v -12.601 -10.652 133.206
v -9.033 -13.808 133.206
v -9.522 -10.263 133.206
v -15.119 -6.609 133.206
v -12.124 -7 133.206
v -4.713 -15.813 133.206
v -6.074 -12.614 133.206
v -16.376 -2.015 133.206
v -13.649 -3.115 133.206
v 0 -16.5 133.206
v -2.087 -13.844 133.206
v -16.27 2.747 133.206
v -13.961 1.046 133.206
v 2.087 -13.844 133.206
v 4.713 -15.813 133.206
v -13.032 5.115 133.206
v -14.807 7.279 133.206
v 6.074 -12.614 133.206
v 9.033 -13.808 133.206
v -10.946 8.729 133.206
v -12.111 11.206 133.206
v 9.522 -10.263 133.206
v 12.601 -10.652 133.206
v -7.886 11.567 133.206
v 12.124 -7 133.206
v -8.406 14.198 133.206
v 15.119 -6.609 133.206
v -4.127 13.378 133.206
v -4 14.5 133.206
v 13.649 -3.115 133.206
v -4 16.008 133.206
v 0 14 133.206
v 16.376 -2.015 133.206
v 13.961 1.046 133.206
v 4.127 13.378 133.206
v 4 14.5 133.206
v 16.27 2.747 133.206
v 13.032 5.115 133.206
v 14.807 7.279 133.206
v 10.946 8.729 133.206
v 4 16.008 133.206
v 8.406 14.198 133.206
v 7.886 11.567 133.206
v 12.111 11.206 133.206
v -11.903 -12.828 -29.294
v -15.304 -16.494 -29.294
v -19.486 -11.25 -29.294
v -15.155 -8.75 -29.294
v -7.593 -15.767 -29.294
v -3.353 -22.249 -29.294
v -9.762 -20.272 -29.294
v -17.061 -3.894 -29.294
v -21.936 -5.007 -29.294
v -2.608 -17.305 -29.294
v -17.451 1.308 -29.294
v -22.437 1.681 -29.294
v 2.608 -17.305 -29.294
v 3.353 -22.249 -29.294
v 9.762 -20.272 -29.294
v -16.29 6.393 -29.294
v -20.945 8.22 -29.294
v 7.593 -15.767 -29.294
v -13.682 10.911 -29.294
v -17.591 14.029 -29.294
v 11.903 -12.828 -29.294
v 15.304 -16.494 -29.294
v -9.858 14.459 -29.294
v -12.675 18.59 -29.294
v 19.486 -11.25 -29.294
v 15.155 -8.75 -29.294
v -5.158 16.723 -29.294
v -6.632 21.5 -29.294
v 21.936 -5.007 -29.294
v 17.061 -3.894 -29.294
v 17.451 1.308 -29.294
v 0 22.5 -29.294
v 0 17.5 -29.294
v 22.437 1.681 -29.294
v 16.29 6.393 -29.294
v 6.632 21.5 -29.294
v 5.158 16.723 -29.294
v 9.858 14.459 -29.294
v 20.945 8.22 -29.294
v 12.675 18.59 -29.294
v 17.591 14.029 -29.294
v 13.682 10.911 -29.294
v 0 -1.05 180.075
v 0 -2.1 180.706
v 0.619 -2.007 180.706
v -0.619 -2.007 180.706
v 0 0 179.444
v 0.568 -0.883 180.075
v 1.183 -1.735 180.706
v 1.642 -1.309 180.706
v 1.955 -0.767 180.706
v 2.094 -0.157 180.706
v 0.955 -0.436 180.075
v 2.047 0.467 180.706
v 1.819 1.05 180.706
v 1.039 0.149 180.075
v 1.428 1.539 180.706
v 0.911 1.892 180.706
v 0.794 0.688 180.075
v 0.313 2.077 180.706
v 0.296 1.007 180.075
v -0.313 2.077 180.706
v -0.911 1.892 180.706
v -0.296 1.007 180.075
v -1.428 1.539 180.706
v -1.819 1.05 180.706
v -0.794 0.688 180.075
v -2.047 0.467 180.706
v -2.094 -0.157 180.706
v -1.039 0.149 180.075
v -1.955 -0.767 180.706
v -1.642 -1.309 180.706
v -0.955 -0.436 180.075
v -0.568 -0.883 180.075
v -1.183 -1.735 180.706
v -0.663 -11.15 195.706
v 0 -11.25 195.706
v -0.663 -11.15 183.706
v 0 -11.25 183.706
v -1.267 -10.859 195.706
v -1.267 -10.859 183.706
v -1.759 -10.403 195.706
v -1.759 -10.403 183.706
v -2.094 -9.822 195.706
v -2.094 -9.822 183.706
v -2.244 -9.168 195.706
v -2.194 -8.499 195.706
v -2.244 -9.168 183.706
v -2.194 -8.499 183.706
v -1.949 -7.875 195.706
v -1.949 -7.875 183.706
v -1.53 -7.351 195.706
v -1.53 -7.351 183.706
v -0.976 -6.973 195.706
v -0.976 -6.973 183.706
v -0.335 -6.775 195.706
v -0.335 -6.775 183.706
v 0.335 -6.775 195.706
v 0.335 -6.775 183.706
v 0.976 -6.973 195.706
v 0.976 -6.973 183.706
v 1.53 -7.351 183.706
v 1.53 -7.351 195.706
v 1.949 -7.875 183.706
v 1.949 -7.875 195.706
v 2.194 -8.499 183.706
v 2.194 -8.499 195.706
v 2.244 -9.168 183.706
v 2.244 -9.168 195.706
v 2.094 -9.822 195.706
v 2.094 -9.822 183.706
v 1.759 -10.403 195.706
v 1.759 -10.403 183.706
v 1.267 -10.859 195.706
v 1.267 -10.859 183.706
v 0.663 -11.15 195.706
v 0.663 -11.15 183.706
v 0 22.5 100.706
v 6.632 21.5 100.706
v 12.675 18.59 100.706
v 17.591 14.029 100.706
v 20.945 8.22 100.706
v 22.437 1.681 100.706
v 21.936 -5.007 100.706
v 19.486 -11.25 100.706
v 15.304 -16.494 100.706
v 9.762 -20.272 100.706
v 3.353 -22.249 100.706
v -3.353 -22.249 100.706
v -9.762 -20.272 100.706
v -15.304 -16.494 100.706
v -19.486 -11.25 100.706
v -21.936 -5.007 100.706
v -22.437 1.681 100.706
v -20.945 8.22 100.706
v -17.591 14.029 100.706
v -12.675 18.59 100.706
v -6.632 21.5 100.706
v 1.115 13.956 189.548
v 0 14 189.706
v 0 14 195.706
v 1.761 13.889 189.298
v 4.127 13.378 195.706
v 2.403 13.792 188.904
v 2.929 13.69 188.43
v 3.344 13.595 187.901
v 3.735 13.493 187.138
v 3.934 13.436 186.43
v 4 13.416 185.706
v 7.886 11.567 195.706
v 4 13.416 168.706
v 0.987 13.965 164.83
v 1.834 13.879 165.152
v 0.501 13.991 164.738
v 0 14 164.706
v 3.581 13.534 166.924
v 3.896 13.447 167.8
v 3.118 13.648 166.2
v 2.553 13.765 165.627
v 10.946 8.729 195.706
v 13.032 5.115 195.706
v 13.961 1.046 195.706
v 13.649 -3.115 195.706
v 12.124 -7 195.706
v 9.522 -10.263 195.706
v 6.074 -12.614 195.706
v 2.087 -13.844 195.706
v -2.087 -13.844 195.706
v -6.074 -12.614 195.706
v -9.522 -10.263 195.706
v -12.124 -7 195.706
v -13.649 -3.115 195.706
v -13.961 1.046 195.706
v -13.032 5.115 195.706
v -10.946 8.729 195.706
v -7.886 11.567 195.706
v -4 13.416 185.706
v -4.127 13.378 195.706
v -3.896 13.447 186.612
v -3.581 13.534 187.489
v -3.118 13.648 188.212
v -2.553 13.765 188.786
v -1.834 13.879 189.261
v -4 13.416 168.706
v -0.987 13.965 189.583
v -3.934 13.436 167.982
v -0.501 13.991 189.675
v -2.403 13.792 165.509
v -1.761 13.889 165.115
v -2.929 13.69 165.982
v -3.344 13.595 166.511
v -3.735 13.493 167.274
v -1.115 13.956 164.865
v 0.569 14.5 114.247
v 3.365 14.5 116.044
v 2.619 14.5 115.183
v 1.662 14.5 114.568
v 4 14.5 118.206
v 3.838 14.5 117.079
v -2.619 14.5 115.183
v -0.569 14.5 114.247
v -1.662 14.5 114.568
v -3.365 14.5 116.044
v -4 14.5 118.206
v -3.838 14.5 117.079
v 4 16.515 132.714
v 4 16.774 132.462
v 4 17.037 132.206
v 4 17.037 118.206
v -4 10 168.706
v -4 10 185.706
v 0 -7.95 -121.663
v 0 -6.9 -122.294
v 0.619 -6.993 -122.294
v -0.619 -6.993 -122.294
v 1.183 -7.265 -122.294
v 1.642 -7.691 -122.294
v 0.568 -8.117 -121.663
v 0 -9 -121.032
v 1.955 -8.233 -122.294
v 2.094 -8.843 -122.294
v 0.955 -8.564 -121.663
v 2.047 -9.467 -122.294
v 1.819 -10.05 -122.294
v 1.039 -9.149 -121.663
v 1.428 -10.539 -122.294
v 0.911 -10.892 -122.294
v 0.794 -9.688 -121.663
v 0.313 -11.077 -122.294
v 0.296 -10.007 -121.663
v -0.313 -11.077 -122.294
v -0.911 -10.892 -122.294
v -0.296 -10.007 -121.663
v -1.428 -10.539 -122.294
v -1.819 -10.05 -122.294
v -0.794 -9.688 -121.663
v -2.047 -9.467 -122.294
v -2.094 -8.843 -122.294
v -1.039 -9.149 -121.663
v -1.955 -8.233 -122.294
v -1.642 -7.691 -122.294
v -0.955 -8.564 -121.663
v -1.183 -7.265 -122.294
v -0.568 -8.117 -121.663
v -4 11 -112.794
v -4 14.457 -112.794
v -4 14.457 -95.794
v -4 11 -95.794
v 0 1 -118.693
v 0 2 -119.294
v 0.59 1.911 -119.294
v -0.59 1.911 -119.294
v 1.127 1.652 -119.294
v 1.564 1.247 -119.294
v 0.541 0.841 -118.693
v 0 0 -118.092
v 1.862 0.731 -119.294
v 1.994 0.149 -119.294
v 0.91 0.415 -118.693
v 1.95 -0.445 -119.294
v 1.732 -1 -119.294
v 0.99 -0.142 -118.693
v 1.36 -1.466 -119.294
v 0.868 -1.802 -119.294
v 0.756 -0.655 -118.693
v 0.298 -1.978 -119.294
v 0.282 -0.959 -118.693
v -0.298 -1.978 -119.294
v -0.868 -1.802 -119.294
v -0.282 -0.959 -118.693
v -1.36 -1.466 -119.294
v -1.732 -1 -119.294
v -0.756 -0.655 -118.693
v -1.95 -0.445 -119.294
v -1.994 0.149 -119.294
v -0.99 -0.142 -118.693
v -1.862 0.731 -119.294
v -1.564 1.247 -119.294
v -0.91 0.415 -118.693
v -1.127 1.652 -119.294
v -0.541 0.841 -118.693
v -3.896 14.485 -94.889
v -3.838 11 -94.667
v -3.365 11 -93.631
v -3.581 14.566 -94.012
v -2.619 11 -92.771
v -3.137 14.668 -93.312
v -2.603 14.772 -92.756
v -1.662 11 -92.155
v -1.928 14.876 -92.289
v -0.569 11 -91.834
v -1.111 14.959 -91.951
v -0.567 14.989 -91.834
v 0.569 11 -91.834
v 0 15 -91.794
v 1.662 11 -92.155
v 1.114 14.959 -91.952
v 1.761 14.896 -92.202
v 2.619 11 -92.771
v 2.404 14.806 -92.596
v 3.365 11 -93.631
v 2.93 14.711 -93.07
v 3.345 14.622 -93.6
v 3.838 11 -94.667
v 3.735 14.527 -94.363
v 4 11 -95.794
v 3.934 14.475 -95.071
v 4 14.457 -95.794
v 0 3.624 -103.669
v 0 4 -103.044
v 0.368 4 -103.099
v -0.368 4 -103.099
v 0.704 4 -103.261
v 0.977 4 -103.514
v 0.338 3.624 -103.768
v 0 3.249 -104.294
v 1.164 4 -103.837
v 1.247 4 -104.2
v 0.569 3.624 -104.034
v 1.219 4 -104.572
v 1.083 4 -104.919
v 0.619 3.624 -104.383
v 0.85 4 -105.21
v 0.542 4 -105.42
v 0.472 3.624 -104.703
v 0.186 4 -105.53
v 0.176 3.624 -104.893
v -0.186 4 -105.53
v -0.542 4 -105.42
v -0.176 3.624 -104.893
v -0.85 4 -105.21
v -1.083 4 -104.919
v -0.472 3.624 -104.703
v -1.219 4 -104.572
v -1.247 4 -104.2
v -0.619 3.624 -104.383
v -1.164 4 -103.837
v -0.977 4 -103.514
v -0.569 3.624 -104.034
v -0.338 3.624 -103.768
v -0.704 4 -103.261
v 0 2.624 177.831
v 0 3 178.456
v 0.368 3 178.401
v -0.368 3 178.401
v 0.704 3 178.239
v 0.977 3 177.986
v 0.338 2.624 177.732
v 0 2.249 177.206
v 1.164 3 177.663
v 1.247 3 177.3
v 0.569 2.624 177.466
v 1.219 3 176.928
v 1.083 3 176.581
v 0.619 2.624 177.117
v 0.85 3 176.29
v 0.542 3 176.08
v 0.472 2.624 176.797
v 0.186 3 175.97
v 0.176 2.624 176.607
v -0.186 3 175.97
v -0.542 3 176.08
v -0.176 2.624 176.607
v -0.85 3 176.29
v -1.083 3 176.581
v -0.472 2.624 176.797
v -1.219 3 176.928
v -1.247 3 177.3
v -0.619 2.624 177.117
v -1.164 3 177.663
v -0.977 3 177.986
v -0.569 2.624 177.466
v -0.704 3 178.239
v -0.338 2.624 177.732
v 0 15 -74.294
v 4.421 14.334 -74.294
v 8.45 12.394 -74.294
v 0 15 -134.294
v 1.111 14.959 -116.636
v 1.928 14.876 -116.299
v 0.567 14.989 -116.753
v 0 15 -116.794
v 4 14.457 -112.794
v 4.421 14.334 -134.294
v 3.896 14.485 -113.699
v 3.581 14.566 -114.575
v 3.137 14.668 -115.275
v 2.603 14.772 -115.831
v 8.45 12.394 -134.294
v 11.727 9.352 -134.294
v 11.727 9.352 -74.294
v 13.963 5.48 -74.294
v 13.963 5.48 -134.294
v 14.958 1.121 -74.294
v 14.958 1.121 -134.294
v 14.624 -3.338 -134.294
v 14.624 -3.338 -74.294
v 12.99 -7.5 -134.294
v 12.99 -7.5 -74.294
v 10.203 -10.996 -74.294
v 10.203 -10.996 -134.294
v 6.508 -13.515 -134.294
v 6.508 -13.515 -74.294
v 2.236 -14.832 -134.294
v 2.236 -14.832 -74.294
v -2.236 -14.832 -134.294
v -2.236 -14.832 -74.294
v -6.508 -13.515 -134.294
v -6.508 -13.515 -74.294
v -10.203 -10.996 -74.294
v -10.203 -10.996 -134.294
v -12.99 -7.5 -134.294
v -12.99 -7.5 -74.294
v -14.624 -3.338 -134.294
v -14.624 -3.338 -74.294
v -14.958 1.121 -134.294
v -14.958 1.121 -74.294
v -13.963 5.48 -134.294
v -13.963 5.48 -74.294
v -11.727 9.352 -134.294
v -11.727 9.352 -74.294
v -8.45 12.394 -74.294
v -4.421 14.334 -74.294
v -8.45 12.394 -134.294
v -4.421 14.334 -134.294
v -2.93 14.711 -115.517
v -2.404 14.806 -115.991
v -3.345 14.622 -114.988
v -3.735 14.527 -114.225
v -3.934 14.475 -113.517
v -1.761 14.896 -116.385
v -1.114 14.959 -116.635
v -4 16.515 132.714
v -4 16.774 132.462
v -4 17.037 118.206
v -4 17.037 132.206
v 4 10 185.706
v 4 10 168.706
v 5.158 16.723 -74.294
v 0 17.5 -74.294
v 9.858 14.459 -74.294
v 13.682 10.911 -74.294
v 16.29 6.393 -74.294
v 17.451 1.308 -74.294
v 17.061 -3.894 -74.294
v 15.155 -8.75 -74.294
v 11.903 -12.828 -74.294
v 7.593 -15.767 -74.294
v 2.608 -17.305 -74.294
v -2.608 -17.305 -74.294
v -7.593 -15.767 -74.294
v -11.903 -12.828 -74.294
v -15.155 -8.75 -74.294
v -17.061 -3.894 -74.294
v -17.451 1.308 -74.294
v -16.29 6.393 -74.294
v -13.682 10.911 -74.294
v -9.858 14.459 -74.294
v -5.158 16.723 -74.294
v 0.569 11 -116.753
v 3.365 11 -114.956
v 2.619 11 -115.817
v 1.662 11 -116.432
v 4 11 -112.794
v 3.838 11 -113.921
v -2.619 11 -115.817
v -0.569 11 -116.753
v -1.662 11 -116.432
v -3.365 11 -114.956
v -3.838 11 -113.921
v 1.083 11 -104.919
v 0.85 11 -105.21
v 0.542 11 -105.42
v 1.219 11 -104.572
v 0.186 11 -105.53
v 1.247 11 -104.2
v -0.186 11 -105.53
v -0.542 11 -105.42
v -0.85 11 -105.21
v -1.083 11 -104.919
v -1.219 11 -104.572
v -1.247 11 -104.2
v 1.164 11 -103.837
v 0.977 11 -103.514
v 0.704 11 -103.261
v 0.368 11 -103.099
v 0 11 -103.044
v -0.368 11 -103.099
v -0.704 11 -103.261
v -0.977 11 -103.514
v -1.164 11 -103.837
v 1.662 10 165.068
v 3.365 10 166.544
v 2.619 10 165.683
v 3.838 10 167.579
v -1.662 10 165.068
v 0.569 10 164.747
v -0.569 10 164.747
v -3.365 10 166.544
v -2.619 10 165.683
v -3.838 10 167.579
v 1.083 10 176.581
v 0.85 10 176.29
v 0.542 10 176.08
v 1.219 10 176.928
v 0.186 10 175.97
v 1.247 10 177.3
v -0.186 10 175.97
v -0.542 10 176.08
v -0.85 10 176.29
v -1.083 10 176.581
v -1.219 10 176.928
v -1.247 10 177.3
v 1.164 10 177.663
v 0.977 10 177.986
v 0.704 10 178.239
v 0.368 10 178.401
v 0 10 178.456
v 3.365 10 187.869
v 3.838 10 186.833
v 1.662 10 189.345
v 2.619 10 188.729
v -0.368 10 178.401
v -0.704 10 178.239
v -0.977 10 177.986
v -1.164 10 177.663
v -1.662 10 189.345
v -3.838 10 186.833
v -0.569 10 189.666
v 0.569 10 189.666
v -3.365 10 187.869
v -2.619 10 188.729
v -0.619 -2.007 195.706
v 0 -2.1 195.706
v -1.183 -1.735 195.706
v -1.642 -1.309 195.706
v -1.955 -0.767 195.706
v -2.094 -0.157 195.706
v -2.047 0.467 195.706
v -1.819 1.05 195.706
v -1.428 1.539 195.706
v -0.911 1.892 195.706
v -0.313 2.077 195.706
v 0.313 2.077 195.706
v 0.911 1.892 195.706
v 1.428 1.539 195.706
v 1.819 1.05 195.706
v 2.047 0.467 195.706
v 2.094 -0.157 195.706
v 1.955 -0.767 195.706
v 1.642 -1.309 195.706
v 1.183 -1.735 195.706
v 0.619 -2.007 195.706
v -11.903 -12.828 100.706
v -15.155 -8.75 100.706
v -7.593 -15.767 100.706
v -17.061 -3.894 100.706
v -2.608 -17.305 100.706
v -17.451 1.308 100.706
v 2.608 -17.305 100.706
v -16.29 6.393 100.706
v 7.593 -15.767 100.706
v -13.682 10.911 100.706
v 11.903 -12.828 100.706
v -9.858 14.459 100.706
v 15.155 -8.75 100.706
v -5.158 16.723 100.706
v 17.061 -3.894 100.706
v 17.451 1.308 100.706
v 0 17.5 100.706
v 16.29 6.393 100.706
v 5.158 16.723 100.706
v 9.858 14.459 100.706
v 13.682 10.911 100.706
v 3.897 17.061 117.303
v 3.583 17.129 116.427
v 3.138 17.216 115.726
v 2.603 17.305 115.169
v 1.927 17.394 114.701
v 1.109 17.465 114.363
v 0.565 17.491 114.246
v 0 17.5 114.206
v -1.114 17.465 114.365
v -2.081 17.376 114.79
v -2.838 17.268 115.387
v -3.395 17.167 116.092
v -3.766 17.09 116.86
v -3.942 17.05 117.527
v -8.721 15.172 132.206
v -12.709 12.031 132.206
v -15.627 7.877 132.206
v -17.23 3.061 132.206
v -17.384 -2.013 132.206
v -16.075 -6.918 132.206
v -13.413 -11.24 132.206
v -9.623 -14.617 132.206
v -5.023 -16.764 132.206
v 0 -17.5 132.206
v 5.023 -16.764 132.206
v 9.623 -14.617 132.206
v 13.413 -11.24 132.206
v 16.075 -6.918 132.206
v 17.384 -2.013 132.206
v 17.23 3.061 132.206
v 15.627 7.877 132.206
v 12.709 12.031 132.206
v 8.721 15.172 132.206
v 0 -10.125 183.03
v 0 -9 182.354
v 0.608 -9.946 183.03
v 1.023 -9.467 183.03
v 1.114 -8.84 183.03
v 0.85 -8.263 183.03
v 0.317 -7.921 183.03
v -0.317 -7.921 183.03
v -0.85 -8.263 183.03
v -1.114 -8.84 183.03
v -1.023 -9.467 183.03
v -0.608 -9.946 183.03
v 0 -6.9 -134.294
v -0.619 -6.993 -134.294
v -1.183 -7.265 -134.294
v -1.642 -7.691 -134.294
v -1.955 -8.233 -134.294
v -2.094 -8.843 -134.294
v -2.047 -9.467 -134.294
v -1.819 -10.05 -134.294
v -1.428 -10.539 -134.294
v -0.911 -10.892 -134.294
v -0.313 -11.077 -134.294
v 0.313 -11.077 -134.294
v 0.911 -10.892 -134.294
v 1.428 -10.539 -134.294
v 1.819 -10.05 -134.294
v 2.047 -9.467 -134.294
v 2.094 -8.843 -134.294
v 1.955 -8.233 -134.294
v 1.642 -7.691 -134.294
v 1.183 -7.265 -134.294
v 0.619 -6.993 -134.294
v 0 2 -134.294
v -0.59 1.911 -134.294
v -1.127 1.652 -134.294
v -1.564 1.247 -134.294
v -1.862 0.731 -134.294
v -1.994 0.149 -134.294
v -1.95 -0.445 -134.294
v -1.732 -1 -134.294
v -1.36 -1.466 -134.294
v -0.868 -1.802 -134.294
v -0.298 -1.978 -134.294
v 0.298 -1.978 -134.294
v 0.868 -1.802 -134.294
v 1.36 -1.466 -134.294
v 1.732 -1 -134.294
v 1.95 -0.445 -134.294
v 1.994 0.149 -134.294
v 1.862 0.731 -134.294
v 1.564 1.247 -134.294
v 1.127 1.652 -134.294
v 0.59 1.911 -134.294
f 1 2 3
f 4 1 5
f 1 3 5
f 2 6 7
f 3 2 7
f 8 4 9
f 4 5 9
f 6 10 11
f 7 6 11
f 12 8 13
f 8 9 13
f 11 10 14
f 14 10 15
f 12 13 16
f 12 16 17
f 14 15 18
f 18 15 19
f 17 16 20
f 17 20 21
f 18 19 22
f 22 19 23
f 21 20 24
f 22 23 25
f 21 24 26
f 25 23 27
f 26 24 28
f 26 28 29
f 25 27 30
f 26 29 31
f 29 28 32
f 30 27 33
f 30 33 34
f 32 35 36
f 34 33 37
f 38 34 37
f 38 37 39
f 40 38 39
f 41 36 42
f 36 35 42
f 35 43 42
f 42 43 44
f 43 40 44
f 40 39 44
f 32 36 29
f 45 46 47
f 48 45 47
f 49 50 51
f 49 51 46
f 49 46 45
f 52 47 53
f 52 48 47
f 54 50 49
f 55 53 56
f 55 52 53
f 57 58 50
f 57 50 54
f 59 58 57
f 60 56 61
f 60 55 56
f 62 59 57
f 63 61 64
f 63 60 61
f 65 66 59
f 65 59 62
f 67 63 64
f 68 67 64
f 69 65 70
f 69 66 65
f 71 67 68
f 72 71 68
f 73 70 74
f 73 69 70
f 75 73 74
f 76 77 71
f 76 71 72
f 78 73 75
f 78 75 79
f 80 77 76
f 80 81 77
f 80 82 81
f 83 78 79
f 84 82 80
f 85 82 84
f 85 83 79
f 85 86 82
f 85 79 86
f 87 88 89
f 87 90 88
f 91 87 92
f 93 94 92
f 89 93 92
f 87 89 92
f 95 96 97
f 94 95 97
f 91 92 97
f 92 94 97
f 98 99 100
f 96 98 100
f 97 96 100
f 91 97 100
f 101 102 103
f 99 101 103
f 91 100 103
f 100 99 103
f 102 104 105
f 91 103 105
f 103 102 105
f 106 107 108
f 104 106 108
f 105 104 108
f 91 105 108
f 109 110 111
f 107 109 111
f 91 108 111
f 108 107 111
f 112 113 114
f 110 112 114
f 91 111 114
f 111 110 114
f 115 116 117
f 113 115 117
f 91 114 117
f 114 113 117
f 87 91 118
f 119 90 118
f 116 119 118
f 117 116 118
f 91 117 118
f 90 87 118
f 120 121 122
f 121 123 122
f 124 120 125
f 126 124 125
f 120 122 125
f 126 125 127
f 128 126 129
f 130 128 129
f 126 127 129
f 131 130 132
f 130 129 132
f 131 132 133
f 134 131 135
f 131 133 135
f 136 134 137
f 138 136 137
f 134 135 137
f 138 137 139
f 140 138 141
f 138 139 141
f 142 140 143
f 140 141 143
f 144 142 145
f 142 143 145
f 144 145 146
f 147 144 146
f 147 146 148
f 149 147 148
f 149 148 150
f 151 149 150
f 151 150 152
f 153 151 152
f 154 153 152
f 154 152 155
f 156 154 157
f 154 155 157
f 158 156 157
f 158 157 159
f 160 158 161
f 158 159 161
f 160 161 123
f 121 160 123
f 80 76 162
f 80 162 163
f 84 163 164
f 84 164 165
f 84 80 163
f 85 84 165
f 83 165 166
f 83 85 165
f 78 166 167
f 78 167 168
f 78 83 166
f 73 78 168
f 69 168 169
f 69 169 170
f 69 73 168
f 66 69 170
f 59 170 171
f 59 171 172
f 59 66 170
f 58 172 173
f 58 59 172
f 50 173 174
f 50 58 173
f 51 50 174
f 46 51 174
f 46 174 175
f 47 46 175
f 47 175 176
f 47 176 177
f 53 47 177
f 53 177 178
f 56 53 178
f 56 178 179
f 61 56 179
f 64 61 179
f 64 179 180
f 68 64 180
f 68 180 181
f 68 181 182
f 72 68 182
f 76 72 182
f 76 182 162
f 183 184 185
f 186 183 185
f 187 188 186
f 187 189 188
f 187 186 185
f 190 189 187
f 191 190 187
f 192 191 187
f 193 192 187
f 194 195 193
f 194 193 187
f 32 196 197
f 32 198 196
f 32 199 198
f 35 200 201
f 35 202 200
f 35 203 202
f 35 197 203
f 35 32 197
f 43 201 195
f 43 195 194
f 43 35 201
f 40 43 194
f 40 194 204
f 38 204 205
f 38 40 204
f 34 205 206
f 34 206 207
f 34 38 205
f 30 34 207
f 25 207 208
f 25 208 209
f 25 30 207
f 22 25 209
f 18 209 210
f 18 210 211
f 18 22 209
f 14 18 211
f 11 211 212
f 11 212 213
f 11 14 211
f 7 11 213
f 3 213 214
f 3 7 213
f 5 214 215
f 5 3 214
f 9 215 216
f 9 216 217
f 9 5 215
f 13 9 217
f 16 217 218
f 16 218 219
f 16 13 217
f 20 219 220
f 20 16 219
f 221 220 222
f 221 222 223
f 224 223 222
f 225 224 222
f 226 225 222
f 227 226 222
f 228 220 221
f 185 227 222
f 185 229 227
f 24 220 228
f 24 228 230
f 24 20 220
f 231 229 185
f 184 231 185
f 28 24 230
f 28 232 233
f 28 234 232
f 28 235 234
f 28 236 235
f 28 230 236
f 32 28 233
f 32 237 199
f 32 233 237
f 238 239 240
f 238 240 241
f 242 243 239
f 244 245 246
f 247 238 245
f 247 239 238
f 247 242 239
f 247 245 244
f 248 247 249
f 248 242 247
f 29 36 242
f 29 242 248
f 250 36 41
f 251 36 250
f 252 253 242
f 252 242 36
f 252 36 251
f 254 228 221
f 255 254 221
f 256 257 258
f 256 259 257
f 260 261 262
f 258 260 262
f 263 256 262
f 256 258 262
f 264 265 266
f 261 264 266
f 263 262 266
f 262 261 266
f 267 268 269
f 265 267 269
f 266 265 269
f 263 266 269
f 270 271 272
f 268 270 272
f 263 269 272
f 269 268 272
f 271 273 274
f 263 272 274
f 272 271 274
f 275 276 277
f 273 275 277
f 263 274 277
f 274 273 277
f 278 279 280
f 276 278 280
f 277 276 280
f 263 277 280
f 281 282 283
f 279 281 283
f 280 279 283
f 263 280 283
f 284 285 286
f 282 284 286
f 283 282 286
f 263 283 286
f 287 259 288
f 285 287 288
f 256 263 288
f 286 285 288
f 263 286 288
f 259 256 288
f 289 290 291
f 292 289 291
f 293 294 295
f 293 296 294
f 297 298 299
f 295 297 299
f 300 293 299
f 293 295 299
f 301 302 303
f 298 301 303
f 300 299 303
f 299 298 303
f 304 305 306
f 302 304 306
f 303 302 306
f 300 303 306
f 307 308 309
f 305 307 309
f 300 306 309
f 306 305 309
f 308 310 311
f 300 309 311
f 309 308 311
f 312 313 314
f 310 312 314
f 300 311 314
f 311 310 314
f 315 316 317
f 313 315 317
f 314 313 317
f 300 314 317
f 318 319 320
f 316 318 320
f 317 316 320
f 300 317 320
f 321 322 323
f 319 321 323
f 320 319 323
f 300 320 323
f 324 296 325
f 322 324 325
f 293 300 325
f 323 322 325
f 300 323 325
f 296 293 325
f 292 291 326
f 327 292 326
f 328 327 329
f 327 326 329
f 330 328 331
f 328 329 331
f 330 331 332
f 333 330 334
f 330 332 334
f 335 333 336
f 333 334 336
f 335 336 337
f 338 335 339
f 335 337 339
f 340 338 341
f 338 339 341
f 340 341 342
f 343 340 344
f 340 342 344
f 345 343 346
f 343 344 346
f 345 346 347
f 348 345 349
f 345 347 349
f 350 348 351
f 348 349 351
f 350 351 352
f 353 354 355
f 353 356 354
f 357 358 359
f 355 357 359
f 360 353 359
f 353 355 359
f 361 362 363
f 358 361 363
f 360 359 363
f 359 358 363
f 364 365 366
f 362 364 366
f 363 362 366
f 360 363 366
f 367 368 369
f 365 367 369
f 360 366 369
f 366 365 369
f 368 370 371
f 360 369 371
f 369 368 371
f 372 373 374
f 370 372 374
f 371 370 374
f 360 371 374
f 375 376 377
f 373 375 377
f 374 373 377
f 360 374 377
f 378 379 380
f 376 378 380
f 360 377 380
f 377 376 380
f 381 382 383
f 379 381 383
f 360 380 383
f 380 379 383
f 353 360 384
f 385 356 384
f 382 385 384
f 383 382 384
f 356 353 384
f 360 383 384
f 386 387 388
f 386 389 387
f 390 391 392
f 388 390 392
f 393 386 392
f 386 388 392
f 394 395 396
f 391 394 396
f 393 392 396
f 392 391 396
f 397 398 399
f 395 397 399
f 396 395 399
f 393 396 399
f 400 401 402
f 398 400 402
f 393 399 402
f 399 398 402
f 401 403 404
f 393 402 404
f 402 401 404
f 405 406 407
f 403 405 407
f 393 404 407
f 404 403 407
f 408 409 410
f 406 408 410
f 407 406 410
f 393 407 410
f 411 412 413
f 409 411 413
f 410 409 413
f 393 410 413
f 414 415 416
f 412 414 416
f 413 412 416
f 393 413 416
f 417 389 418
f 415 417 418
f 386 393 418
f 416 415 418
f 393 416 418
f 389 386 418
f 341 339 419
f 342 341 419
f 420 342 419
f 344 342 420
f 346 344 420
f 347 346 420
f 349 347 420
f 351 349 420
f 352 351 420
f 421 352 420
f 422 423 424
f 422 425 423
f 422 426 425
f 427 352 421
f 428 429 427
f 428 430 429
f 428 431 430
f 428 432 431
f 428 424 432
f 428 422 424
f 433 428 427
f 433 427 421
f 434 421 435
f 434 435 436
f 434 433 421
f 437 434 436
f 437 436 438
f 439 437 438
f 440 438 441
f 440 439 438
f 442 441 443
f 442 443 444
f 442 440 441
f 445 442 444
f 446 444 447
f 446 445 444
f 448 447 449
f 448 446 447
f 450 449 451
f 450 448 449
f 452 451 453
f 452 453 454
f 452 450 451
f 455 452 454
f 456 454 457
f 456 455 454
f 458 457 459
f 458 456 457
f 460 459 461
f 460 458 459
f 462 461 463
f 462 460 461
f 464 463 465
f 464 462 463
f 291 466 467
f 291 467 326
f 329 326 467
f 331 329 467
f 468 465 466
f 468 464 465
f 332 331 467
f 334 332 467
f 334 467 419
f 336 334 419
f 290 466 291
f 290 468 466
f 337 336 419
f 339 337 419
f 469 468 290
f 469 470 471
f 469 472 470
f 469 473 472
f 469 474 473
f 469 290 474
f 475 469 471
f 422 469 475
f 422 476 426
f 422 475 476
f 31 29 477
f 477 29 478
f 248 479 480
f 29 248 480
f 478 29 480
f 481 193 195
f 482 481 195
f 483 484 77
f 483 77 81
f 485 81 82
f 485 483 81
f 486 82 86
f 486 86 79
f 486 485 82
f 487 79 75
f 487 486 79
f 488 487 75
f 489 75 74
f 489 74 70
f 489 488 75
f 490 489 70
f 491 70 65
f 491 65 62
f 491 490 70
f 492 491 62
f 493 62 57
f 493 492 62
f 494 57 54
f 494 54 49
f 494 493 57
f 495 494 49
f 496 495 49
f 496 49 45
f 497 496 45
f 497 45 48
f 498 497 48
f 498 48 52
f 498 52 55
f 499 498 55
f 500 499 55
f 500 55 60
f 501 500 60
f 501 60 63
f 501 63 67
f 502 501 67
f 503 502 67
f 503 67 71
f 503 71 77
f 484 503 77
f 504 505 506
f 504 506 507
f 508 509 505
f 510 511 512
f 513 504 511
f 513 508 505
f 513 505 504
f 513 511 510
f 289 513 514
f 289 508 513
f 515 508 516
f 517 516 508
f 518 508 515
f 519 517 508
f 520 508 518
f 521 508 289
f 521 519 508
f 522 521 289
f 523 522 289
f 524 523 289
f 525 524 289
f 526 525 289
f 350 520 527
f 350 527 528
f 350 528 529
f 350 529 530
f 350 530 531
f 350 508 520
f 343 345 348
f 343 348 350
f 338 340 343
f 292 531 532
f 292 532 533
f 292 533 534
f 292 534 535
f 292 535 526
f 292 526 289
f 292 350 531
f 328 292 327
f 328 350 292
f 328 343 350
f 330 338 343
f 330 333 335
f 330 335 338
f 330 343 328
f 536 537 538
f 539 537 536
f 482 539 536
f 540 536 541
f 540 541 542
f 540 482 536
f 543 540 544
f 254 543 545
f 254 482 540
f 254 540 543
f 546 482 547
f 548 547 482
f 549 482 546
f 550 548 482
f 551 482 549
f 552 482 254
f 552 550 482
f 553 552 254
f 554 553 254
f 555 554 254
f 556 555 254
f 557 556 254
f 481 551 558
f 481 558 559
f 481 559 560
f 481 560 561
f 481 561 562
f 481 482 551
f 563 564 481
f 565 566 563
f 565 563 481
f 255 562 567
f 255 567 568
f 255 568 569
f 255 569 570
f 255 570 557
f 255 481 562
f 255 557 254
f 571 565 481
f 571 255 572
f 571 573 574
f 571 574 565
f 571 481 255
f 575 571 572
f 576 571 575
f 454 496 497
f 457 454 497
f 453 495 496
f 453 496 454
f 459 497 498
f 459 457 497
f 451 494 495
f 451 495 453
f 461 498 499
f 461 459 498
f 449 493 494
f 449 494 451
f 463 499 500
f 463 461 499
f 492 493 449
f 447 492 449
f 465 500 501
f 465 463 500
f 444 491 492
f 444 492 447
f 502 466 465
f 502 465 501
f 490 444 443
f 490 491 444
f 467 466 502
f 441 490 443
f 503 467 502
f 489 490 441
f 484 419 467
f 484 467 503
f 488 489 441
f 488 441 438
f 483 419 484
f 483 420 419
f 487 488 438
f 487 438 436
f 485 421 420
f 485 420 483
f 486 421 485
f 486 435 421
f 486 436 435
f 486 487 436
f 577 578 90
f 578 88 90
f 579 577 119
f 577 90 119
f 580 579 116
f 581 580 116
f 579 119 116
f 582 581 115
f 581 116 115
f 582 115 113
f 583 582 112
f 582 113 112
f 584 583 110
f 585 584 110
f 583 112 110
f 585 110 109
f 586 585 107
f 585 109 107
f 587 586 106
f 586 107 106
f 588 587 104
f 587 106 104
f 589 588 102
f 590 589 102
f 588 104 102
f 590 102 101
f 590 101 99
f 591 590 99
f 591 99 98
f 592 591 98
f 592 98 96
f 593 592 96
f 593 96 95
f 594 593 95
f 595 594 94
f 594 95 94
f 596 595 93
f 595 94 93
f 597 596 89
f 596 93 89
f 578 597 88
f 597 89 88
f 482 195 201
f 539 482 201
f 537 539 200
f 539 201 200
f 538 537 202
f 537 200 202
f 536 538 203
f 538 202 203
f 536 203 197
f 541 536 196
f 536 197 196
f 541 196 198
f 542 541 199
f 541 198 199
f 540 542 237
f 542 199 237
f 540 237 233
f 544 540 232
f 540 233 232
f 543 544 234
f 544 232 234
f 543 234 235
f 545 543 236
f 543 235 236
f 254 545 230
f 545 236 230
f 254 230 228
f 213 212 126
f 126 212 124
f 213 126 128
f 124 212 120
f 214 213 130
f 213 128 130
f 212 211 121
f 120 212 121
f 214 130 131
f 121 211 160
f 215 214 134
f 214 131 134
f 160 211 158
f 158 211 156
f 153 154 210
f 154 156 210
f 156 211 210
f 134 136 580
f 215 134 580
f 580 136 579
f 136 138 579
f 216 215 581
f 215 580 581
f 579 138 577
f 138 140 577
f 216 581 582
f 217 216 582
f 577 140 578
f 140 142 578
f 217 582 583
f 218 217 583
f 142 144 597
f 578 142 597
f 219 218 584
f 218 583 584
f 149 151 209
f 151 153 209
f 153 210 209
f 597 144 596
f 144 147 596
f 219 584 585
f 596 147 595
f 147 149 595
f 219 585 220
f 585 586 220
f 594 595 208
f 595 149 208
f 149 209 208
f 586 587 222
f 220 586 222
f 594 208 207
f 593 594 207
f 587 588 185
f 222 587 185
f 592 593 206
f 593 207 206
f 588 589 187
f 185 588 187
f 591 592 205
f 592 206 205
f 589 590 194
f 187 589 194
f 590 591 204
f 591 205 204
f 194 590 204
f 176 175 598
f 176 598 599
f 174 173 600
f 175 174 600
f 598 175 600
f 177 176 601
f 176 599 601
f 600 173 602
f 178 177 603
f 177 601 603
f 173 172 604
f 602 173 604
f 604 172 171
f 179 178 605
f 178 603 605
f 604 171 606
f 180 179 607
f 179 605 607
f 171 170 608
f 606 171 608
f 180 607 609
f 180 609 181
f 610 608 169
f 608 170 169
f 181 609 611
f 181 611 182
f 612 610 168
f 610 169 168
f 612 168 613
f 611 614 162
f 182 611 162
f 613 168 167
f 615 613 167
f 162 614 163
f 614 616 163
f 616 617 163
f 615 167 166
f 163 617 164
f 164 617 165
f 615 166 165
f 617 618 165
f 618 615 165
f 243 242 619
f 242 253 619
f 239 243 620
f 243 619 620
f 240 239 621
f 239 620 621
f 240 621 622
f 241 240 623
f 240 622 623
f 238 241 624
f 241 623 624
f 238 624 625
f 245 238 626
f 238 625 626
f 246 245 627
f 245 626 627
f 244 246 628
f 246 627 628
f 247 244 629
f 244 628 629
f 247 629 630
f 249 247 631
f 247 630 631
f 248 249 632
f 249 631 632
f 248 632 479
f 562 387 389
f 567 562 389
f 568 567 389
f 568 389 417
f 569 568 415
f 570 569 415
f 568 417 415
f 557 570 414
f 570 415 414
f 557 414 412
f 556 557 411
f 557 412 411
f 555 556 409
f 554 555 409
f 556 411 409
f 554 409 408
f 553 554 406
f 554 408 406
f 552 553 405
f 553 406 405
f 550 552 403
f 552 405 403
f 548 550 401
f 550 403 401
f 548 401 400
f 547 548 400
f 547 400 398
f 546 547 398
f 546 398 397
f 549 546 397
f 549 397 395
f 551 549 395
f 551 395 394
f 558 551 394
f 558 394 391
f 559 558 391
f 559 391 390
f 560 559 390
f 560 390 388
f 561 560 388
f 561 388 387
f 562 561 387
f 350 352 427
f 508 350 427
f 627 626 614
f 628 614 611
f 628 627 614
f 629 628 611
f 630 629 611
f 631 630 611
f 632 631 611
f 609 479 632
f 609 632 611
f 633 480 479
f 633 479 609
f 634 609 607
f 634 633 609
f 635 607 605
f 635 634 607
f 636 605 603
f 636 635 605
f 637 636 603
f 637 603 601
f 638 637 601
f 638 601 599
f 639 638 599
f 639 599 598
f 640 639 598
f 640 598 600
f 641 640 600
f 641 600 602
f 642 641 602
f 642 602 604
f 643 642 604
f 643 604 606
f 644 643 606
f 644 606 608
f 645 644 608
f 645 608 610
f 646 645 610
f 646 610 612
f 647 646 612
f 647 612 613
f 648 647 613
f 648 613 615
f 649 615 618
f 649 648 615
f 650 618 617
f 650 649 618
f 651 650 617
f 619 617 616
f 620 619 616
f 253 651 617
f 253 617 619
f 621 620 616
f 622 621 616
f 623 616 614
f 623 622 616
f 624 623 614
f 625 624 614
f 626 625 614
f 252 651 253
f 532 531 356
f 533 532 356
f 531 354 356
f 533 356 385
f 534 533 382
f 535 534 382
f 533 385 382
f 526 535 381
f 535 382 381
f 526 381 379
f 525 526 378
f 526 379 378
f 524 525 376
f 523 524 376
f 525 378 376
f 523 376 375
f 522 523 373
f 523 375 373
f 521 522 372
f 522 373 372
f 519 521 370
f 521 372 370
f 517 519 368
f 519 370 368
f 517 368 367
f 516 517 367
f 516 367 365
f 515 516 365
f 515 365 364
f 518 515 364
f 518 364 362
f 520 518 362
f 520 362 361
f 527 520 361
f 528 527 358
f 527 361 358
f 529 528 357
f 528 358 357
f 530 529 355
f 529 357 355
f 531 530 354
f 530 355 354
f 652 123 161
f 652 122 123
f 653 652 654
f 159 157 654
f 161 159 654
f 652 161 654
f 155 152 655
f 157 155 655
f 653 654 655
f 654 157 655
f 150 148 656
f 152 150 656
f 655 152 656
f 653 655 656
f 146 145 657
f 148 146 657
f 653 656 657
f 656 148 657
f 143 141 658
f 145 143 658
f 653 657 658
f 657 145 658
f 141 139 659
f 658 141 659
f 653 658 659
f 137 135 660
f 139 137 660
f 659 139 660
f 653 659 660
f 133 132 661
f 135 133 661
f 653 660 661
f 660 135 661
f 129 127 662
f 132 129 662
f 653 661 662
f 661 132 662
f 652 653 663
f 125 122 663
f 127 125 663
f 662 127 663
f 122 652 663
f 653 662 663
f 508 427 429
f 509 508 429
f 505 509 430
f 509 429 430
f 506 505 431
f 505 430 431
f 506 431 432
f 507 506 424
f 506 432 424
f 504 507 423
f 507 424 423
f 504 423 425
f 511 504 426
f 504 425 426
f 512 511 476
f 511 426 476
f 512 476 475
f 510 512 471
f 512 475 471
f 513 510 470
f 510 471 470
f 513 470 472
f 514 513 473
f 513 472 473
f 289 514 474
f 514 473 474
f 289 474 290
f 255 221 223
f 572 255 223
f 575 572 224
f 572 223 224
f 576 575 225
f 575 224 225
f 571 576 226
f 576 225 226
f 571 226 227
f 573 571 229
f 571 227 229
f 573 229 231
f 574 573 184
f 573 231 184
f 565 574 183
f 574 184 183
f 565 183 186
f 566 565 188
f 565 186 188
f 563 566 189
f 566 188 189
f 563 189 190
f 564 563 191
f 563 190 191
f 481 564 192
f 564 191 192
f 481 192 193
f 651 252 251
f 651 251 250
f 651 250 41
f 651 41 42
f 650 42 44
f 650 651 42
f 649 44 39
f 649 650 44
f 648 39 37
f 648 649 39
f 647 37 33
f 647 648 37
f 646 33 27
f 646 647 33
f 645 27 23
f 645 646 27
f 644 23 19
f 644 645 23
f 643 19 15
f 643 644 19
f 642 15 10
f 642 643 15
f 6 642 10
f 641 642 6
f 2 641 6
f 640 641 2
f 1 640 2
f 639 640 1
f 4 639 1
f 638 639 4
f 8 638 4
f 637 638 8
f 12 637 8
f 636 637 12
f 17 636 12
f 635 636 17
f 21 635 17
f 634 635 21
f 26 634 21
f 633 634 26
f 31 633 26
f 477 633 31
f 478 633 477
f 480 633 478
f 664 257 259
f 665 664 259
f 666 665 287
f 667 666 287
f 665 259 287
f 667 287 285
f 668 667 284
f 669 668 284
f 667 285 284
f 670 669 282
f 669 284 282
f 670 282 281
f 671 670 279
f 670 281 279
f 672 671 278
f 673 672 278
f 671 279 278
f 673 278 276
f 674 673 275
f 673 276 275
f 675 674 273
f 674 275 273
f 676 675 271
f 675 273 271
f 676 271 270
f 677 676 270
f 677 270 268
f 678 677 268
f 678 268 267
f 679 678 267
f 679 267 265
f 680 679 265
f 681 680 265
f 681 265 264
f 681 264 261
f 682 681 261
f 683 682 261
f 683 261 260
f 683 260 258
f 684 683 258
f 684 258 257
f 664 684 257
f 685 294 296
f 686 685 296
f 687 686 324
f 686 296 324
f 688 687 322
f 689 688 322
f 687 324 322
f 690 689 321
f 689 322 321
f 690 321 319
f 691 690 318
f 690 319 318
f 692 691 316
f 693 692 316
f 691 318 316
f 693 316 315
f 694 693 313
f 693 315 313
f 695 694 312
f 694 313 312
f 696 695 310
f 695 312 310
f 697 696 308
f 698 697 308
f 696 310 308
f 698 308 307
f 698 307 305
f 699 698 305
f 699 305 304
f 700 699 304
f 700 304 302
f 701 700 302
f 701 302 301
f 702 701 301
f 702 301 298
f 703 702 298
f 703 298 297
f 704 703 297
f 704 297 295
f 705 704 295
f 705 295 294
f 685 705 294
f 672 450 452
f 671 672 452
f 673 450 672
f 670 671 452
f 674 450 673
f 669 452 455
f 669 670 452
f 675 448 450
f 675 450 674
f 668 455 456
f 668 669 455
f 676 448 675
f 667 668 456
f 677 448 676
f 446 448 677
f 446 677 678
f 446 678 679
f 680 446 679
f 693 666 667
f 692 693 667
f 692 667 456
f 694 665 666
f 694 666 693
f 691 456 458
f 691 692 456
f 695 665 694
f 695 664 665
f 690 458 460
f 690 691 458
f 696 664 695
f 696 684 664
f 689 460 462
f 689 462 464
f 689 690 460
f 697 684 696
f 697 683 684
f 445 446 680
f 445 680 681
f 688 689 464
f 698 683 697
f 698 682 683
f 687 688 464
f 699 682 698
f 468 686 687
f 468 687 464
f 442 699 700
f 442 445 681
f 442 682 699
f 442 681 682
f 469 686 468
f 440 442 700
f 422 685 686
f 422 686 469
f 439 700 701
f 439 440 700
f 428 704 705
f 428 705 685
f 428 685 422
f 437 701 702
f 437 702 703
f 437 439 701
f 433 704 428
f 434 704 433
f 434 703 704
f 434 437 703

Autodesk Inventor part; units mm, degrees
ref_plane "YZ Plane" through (0, 0, 0) normal (1, 0, 0) x (0, 1, 0)
sketch "Sketch1" plane through (0, 0, 0) normal (1, 0, 0) x (0, 1, 0)
  line L0 (0, 195.7063) -> (0, -134.2937)
  line L1 (0, 195.7063) -> (14, 195.7063)
  line L2 (15, -134.2937) -> (0, -134.2937)
  line L3 (17.5, 100.7063) -> (22.5, 100.7063)
  line L4 (22.5, 100.7063) -> (22.5, -29.2937)
  line L5 (22.5, -29.2937) -> (17.5, -29.2937)
  line L6 (17.5, 100.7063) -> (17.5, 133.2063)
  line L7 (17.5, 133.2063) -> (14, 133.2063)
  line L8 (17.5, -29.2937) -> (17.5, -74.2937)
  line L9 (17.5, -74.2937) -> (15, -74.2937)
  line L10 (14, 195.7063) -> (14, 133.2063)
  line L11 (15, -74.2937) -> (15, -134.2937)
  point P0 (0, 0)
  point P1 (15.75, 133.2063)
  point P2 (20, -29.2937)
  point P3 (7.5, -134.2937)
  point P4 (16.25, -74.2937)
  dimension "d0" = 330
  dimension "d1" = 28
  dimension "d2" = 35
  dimension "d3" = 45
  dimension "d4" = 35
  dimension "d5" = 30
  dimension "d6" = 95
  dimension "d7" = 62.5
  dimension "d8" = 105
  dimension "d9" = 60
revolve "Revolution1" add sketch "Sketch1" angle 360 about axis through (0, 0, 195.7063) along (0, 0, -1)
thread "Thread3" size "M35x1.5" class "6g" standard "ISO Metric profile" length 18
chamfer "Chamfer2" distance 1 angle 45 1 edges at (0, -17.5, 133.2063)
thread "Thread4" size "R 1" standard "ISO Taper" length 23.2
ref_plane "Work Plane1" through (0, 14, 0) normal (0, 1, 0) x (-1, 0, 0)
ref_plane "Work Plane2" through (0, 17.5, 0) normal (0, 1, 0) x (-1, 0, 0)
sketch "Sketch2" plane through (0, 14, 0) normal (0, 1, 0) x (-1, 0, 0)
  line L0 (-14, 195.7063) -> (14, 195.7063) projected
  line L1 (14, 195.7063) -> (14, 133.2063) projected
  line L2 (-14, 195.7063) -> (-14, 133.2063) projected
  line L3 (0, 185.7063) -> (0, 168.7063) construction
  line L4 (-4, 185.7063) -> (-4, 168.7063)
  line L5 (4, 168.7063) -> (4, 185.7063)
  arc A0 (4, 185.7063) -> (-4, 185.7063) centre (0, 185.7063) ccw
  arc A1 (-4, 168.7063) -> (4, 168.7063) centre (0, 168.7063) ccw
  point P0 (0, 0)
  point P1 (0, 177.2063)
  point P2 (0, 164.7063)
  point P3 (0, 189.7063)
  dimension "d29" = 25
  dimension "d30" = 6
  dimension "d31" = 8
extrude "Extrusion1" cut sketch "Sketch2" against normal blind 4
sketch "Sketch3" plane through (0, 17.5, 0) normal (0, 1, 0) x (-1, 0, 0)
  arc A0 (-4, 118.2063) -> (4, 118.2063) centre (0, 118.2063) ccw
  line L0 (4, 118.2063) -> (4, 133.2938)
  line L1 (-4, 118.2063) -> (-4, 133.2063)
  line L2 (-14, 133.2063) -> (14, 133.2063) projected
  point P0 (0, 0)
  point P1 (0, 114.2063)
  point P2 (0, 133.2063)
  point P3 (4, 133.2063)
  dimension "d34" = 8
  dimension "d35" = 19
extrude "Extrusion2" cut sketch "Sketch3" against normal blind 3
ref_plane "Work Plane3" through (0, 15, 0) normal (0, 1, 0) x (-1, 0, 0)
sketch "Sketch4" plane through (0, 15, 0) normal (0, 1, 0) x (-1, 0, 0)
  line L0 (0, -95.7937) -> (0, -112.7937) construction
  line L1 (-4, -95.7937) -> (-4, -112.7937)
  line L2 (4, -112.7937) -> (4, -95.7937)
  arc A0 (4, -95.7937) -> (-4, -95.7937) centre (0, -95.7937) ccw
  arc A1 (-4, -112.7937) -> (4, -112.7937) centre (0, -112.7937) ccw
  line L3 (-15, -134.2937) -> (15, -134.2937) projected
  point P0 (0, 0)
  point P1 (0, -104.2937)
  point P2 (0, -116.7937)
  point P3 (0, -91.7937)
  dimension "d39" = 8
  dimension "d40" = 25
  dimension "d41" = 17.5
extrude "Extrusion3" cut sketch "Sketch4" against normal blind 4
sketch "Sketch11" plane through (0, 11, 0) normal (0, 1, 0) x (1, 0, 0)
  arc A0 (4, 112.7937) -> (-4, 112.7937) centre (0, 112.7937) ccw projected
  line L0 (4, 112.7937) -> (4, 104.2937)
  line L1 (4, 112.7937) -> (4, 95.7937) projected
  line L2 (4, 104.2937) -> (0, 104.2937)
  point P0 (0, 0)
  dimension "d100" = 8.5
  dimension "d101" = 4
sketch "Sketch12" plane through (0, 10, 0) normal (0, 1, 0) x (1, 0, 0)
  arc A0 (-4, -185.7063) -> (4, -185.7063) centre (0, -185.7063) ccw projected
  line L0 (4, -185.7063) -> (4, -177.2063)
  line L1 (4, -177.2063) -> (0, -177.2063)
  point P0 (0, 0)
  dimension "d102" = 8.5
  dimension "d103" = 4
sketch "Sketch5" plane through (0, 0, 195.7063) normal (0, 0, 1) x (1, 0, 0)
  circle A0 centre (0, 0) radius 3
  circle A1 centre (0, -9) radius 2.25
  dimension "d44" = 6
  dimension "d45" = 4.5
  dimension "d46" = 9
hole "Hole1" at (0, -9, 195.7063) direction (0, 0, -1) diameter 4.5 depth 12 tip angle 118
sketch "Sketch6" plane through (0, 0, 195.7063) normal (0, 0, 1) x (1, 0, 0)
  circle A0 centre (0, 0) radius 14 projected
hole "Hole2" at (0, 0, 195.7063) direction (0, 0, -1) diameter 4.2 depth 15 tip angle 118
thread "Thread5" size "M5x0.8" class "6H" standard "ISO Metric profile" length 10
sketch "Sketch7" plane through (0, 0, -134.2937) normal (0, 0, -1) x (-1, 0, 0)
  circle A0 centre (0, 0) radius 2.5
  circle A1 centre (0, -9) radius 2.25 projected
  circle A2 centre (0, -9) radius 2.25
  dimension "d63" = 5
hole "Hole3" at (0, -9, -134.2937) direction (0, 0, 1) diameter 4.2 depth 12 tip angle 118
sketch "Sketch8" plane through (0, 0, -134.2937) normal (0, 0, -1) x (-1, 0, 0)
  circle A0 centre (0, 0) radius 15 projected
hole "Hole4" at (0, 0, -134.2937) direction (0, 0, 1) diameter 4 depth 15 tip angle 118
sketch "Sketch9" plane through (0, 10, 0) normal (0, 1, 0) x (1, 0, 0)
  line L0 (4, -168.7063) -> (4, -185.7063) projected
  point P0 (0, 0)
  point P1 (0, -177.2063)
  dimension "d97" = 4
hole "Hole5" at (0, 10, 177.2063) direction (0, -1, 0) diameter 2.5 depth 7 tip angle 118
thread "Thread7" size "M3x0.5" class "6H" standard "ISO Metric profile" length 6
sketch "Sketch10" plane through (0, 11, 0) normal (0, 1, 0) x (1, 0, 0)
  line L0 (4, 112.7937) -> (4, 95.7937) projected
  point P0 (0, 0)
  point P1 (0, 104.2937)
  dimension "d89" = 4
hole "Hole6" at (0, 11, -104.2937) direction (0, -1, 0) diameter 2.5 depth 7 tip angle 118
thread "Thread8" size "M3x0.5" class "6H" standard "ISO Metric profile" length 6 offset 1
thread "Thread10" size "M4x0.7" class "6H" standard "ISO Metric profile" length 10
properties part number "Wał"
